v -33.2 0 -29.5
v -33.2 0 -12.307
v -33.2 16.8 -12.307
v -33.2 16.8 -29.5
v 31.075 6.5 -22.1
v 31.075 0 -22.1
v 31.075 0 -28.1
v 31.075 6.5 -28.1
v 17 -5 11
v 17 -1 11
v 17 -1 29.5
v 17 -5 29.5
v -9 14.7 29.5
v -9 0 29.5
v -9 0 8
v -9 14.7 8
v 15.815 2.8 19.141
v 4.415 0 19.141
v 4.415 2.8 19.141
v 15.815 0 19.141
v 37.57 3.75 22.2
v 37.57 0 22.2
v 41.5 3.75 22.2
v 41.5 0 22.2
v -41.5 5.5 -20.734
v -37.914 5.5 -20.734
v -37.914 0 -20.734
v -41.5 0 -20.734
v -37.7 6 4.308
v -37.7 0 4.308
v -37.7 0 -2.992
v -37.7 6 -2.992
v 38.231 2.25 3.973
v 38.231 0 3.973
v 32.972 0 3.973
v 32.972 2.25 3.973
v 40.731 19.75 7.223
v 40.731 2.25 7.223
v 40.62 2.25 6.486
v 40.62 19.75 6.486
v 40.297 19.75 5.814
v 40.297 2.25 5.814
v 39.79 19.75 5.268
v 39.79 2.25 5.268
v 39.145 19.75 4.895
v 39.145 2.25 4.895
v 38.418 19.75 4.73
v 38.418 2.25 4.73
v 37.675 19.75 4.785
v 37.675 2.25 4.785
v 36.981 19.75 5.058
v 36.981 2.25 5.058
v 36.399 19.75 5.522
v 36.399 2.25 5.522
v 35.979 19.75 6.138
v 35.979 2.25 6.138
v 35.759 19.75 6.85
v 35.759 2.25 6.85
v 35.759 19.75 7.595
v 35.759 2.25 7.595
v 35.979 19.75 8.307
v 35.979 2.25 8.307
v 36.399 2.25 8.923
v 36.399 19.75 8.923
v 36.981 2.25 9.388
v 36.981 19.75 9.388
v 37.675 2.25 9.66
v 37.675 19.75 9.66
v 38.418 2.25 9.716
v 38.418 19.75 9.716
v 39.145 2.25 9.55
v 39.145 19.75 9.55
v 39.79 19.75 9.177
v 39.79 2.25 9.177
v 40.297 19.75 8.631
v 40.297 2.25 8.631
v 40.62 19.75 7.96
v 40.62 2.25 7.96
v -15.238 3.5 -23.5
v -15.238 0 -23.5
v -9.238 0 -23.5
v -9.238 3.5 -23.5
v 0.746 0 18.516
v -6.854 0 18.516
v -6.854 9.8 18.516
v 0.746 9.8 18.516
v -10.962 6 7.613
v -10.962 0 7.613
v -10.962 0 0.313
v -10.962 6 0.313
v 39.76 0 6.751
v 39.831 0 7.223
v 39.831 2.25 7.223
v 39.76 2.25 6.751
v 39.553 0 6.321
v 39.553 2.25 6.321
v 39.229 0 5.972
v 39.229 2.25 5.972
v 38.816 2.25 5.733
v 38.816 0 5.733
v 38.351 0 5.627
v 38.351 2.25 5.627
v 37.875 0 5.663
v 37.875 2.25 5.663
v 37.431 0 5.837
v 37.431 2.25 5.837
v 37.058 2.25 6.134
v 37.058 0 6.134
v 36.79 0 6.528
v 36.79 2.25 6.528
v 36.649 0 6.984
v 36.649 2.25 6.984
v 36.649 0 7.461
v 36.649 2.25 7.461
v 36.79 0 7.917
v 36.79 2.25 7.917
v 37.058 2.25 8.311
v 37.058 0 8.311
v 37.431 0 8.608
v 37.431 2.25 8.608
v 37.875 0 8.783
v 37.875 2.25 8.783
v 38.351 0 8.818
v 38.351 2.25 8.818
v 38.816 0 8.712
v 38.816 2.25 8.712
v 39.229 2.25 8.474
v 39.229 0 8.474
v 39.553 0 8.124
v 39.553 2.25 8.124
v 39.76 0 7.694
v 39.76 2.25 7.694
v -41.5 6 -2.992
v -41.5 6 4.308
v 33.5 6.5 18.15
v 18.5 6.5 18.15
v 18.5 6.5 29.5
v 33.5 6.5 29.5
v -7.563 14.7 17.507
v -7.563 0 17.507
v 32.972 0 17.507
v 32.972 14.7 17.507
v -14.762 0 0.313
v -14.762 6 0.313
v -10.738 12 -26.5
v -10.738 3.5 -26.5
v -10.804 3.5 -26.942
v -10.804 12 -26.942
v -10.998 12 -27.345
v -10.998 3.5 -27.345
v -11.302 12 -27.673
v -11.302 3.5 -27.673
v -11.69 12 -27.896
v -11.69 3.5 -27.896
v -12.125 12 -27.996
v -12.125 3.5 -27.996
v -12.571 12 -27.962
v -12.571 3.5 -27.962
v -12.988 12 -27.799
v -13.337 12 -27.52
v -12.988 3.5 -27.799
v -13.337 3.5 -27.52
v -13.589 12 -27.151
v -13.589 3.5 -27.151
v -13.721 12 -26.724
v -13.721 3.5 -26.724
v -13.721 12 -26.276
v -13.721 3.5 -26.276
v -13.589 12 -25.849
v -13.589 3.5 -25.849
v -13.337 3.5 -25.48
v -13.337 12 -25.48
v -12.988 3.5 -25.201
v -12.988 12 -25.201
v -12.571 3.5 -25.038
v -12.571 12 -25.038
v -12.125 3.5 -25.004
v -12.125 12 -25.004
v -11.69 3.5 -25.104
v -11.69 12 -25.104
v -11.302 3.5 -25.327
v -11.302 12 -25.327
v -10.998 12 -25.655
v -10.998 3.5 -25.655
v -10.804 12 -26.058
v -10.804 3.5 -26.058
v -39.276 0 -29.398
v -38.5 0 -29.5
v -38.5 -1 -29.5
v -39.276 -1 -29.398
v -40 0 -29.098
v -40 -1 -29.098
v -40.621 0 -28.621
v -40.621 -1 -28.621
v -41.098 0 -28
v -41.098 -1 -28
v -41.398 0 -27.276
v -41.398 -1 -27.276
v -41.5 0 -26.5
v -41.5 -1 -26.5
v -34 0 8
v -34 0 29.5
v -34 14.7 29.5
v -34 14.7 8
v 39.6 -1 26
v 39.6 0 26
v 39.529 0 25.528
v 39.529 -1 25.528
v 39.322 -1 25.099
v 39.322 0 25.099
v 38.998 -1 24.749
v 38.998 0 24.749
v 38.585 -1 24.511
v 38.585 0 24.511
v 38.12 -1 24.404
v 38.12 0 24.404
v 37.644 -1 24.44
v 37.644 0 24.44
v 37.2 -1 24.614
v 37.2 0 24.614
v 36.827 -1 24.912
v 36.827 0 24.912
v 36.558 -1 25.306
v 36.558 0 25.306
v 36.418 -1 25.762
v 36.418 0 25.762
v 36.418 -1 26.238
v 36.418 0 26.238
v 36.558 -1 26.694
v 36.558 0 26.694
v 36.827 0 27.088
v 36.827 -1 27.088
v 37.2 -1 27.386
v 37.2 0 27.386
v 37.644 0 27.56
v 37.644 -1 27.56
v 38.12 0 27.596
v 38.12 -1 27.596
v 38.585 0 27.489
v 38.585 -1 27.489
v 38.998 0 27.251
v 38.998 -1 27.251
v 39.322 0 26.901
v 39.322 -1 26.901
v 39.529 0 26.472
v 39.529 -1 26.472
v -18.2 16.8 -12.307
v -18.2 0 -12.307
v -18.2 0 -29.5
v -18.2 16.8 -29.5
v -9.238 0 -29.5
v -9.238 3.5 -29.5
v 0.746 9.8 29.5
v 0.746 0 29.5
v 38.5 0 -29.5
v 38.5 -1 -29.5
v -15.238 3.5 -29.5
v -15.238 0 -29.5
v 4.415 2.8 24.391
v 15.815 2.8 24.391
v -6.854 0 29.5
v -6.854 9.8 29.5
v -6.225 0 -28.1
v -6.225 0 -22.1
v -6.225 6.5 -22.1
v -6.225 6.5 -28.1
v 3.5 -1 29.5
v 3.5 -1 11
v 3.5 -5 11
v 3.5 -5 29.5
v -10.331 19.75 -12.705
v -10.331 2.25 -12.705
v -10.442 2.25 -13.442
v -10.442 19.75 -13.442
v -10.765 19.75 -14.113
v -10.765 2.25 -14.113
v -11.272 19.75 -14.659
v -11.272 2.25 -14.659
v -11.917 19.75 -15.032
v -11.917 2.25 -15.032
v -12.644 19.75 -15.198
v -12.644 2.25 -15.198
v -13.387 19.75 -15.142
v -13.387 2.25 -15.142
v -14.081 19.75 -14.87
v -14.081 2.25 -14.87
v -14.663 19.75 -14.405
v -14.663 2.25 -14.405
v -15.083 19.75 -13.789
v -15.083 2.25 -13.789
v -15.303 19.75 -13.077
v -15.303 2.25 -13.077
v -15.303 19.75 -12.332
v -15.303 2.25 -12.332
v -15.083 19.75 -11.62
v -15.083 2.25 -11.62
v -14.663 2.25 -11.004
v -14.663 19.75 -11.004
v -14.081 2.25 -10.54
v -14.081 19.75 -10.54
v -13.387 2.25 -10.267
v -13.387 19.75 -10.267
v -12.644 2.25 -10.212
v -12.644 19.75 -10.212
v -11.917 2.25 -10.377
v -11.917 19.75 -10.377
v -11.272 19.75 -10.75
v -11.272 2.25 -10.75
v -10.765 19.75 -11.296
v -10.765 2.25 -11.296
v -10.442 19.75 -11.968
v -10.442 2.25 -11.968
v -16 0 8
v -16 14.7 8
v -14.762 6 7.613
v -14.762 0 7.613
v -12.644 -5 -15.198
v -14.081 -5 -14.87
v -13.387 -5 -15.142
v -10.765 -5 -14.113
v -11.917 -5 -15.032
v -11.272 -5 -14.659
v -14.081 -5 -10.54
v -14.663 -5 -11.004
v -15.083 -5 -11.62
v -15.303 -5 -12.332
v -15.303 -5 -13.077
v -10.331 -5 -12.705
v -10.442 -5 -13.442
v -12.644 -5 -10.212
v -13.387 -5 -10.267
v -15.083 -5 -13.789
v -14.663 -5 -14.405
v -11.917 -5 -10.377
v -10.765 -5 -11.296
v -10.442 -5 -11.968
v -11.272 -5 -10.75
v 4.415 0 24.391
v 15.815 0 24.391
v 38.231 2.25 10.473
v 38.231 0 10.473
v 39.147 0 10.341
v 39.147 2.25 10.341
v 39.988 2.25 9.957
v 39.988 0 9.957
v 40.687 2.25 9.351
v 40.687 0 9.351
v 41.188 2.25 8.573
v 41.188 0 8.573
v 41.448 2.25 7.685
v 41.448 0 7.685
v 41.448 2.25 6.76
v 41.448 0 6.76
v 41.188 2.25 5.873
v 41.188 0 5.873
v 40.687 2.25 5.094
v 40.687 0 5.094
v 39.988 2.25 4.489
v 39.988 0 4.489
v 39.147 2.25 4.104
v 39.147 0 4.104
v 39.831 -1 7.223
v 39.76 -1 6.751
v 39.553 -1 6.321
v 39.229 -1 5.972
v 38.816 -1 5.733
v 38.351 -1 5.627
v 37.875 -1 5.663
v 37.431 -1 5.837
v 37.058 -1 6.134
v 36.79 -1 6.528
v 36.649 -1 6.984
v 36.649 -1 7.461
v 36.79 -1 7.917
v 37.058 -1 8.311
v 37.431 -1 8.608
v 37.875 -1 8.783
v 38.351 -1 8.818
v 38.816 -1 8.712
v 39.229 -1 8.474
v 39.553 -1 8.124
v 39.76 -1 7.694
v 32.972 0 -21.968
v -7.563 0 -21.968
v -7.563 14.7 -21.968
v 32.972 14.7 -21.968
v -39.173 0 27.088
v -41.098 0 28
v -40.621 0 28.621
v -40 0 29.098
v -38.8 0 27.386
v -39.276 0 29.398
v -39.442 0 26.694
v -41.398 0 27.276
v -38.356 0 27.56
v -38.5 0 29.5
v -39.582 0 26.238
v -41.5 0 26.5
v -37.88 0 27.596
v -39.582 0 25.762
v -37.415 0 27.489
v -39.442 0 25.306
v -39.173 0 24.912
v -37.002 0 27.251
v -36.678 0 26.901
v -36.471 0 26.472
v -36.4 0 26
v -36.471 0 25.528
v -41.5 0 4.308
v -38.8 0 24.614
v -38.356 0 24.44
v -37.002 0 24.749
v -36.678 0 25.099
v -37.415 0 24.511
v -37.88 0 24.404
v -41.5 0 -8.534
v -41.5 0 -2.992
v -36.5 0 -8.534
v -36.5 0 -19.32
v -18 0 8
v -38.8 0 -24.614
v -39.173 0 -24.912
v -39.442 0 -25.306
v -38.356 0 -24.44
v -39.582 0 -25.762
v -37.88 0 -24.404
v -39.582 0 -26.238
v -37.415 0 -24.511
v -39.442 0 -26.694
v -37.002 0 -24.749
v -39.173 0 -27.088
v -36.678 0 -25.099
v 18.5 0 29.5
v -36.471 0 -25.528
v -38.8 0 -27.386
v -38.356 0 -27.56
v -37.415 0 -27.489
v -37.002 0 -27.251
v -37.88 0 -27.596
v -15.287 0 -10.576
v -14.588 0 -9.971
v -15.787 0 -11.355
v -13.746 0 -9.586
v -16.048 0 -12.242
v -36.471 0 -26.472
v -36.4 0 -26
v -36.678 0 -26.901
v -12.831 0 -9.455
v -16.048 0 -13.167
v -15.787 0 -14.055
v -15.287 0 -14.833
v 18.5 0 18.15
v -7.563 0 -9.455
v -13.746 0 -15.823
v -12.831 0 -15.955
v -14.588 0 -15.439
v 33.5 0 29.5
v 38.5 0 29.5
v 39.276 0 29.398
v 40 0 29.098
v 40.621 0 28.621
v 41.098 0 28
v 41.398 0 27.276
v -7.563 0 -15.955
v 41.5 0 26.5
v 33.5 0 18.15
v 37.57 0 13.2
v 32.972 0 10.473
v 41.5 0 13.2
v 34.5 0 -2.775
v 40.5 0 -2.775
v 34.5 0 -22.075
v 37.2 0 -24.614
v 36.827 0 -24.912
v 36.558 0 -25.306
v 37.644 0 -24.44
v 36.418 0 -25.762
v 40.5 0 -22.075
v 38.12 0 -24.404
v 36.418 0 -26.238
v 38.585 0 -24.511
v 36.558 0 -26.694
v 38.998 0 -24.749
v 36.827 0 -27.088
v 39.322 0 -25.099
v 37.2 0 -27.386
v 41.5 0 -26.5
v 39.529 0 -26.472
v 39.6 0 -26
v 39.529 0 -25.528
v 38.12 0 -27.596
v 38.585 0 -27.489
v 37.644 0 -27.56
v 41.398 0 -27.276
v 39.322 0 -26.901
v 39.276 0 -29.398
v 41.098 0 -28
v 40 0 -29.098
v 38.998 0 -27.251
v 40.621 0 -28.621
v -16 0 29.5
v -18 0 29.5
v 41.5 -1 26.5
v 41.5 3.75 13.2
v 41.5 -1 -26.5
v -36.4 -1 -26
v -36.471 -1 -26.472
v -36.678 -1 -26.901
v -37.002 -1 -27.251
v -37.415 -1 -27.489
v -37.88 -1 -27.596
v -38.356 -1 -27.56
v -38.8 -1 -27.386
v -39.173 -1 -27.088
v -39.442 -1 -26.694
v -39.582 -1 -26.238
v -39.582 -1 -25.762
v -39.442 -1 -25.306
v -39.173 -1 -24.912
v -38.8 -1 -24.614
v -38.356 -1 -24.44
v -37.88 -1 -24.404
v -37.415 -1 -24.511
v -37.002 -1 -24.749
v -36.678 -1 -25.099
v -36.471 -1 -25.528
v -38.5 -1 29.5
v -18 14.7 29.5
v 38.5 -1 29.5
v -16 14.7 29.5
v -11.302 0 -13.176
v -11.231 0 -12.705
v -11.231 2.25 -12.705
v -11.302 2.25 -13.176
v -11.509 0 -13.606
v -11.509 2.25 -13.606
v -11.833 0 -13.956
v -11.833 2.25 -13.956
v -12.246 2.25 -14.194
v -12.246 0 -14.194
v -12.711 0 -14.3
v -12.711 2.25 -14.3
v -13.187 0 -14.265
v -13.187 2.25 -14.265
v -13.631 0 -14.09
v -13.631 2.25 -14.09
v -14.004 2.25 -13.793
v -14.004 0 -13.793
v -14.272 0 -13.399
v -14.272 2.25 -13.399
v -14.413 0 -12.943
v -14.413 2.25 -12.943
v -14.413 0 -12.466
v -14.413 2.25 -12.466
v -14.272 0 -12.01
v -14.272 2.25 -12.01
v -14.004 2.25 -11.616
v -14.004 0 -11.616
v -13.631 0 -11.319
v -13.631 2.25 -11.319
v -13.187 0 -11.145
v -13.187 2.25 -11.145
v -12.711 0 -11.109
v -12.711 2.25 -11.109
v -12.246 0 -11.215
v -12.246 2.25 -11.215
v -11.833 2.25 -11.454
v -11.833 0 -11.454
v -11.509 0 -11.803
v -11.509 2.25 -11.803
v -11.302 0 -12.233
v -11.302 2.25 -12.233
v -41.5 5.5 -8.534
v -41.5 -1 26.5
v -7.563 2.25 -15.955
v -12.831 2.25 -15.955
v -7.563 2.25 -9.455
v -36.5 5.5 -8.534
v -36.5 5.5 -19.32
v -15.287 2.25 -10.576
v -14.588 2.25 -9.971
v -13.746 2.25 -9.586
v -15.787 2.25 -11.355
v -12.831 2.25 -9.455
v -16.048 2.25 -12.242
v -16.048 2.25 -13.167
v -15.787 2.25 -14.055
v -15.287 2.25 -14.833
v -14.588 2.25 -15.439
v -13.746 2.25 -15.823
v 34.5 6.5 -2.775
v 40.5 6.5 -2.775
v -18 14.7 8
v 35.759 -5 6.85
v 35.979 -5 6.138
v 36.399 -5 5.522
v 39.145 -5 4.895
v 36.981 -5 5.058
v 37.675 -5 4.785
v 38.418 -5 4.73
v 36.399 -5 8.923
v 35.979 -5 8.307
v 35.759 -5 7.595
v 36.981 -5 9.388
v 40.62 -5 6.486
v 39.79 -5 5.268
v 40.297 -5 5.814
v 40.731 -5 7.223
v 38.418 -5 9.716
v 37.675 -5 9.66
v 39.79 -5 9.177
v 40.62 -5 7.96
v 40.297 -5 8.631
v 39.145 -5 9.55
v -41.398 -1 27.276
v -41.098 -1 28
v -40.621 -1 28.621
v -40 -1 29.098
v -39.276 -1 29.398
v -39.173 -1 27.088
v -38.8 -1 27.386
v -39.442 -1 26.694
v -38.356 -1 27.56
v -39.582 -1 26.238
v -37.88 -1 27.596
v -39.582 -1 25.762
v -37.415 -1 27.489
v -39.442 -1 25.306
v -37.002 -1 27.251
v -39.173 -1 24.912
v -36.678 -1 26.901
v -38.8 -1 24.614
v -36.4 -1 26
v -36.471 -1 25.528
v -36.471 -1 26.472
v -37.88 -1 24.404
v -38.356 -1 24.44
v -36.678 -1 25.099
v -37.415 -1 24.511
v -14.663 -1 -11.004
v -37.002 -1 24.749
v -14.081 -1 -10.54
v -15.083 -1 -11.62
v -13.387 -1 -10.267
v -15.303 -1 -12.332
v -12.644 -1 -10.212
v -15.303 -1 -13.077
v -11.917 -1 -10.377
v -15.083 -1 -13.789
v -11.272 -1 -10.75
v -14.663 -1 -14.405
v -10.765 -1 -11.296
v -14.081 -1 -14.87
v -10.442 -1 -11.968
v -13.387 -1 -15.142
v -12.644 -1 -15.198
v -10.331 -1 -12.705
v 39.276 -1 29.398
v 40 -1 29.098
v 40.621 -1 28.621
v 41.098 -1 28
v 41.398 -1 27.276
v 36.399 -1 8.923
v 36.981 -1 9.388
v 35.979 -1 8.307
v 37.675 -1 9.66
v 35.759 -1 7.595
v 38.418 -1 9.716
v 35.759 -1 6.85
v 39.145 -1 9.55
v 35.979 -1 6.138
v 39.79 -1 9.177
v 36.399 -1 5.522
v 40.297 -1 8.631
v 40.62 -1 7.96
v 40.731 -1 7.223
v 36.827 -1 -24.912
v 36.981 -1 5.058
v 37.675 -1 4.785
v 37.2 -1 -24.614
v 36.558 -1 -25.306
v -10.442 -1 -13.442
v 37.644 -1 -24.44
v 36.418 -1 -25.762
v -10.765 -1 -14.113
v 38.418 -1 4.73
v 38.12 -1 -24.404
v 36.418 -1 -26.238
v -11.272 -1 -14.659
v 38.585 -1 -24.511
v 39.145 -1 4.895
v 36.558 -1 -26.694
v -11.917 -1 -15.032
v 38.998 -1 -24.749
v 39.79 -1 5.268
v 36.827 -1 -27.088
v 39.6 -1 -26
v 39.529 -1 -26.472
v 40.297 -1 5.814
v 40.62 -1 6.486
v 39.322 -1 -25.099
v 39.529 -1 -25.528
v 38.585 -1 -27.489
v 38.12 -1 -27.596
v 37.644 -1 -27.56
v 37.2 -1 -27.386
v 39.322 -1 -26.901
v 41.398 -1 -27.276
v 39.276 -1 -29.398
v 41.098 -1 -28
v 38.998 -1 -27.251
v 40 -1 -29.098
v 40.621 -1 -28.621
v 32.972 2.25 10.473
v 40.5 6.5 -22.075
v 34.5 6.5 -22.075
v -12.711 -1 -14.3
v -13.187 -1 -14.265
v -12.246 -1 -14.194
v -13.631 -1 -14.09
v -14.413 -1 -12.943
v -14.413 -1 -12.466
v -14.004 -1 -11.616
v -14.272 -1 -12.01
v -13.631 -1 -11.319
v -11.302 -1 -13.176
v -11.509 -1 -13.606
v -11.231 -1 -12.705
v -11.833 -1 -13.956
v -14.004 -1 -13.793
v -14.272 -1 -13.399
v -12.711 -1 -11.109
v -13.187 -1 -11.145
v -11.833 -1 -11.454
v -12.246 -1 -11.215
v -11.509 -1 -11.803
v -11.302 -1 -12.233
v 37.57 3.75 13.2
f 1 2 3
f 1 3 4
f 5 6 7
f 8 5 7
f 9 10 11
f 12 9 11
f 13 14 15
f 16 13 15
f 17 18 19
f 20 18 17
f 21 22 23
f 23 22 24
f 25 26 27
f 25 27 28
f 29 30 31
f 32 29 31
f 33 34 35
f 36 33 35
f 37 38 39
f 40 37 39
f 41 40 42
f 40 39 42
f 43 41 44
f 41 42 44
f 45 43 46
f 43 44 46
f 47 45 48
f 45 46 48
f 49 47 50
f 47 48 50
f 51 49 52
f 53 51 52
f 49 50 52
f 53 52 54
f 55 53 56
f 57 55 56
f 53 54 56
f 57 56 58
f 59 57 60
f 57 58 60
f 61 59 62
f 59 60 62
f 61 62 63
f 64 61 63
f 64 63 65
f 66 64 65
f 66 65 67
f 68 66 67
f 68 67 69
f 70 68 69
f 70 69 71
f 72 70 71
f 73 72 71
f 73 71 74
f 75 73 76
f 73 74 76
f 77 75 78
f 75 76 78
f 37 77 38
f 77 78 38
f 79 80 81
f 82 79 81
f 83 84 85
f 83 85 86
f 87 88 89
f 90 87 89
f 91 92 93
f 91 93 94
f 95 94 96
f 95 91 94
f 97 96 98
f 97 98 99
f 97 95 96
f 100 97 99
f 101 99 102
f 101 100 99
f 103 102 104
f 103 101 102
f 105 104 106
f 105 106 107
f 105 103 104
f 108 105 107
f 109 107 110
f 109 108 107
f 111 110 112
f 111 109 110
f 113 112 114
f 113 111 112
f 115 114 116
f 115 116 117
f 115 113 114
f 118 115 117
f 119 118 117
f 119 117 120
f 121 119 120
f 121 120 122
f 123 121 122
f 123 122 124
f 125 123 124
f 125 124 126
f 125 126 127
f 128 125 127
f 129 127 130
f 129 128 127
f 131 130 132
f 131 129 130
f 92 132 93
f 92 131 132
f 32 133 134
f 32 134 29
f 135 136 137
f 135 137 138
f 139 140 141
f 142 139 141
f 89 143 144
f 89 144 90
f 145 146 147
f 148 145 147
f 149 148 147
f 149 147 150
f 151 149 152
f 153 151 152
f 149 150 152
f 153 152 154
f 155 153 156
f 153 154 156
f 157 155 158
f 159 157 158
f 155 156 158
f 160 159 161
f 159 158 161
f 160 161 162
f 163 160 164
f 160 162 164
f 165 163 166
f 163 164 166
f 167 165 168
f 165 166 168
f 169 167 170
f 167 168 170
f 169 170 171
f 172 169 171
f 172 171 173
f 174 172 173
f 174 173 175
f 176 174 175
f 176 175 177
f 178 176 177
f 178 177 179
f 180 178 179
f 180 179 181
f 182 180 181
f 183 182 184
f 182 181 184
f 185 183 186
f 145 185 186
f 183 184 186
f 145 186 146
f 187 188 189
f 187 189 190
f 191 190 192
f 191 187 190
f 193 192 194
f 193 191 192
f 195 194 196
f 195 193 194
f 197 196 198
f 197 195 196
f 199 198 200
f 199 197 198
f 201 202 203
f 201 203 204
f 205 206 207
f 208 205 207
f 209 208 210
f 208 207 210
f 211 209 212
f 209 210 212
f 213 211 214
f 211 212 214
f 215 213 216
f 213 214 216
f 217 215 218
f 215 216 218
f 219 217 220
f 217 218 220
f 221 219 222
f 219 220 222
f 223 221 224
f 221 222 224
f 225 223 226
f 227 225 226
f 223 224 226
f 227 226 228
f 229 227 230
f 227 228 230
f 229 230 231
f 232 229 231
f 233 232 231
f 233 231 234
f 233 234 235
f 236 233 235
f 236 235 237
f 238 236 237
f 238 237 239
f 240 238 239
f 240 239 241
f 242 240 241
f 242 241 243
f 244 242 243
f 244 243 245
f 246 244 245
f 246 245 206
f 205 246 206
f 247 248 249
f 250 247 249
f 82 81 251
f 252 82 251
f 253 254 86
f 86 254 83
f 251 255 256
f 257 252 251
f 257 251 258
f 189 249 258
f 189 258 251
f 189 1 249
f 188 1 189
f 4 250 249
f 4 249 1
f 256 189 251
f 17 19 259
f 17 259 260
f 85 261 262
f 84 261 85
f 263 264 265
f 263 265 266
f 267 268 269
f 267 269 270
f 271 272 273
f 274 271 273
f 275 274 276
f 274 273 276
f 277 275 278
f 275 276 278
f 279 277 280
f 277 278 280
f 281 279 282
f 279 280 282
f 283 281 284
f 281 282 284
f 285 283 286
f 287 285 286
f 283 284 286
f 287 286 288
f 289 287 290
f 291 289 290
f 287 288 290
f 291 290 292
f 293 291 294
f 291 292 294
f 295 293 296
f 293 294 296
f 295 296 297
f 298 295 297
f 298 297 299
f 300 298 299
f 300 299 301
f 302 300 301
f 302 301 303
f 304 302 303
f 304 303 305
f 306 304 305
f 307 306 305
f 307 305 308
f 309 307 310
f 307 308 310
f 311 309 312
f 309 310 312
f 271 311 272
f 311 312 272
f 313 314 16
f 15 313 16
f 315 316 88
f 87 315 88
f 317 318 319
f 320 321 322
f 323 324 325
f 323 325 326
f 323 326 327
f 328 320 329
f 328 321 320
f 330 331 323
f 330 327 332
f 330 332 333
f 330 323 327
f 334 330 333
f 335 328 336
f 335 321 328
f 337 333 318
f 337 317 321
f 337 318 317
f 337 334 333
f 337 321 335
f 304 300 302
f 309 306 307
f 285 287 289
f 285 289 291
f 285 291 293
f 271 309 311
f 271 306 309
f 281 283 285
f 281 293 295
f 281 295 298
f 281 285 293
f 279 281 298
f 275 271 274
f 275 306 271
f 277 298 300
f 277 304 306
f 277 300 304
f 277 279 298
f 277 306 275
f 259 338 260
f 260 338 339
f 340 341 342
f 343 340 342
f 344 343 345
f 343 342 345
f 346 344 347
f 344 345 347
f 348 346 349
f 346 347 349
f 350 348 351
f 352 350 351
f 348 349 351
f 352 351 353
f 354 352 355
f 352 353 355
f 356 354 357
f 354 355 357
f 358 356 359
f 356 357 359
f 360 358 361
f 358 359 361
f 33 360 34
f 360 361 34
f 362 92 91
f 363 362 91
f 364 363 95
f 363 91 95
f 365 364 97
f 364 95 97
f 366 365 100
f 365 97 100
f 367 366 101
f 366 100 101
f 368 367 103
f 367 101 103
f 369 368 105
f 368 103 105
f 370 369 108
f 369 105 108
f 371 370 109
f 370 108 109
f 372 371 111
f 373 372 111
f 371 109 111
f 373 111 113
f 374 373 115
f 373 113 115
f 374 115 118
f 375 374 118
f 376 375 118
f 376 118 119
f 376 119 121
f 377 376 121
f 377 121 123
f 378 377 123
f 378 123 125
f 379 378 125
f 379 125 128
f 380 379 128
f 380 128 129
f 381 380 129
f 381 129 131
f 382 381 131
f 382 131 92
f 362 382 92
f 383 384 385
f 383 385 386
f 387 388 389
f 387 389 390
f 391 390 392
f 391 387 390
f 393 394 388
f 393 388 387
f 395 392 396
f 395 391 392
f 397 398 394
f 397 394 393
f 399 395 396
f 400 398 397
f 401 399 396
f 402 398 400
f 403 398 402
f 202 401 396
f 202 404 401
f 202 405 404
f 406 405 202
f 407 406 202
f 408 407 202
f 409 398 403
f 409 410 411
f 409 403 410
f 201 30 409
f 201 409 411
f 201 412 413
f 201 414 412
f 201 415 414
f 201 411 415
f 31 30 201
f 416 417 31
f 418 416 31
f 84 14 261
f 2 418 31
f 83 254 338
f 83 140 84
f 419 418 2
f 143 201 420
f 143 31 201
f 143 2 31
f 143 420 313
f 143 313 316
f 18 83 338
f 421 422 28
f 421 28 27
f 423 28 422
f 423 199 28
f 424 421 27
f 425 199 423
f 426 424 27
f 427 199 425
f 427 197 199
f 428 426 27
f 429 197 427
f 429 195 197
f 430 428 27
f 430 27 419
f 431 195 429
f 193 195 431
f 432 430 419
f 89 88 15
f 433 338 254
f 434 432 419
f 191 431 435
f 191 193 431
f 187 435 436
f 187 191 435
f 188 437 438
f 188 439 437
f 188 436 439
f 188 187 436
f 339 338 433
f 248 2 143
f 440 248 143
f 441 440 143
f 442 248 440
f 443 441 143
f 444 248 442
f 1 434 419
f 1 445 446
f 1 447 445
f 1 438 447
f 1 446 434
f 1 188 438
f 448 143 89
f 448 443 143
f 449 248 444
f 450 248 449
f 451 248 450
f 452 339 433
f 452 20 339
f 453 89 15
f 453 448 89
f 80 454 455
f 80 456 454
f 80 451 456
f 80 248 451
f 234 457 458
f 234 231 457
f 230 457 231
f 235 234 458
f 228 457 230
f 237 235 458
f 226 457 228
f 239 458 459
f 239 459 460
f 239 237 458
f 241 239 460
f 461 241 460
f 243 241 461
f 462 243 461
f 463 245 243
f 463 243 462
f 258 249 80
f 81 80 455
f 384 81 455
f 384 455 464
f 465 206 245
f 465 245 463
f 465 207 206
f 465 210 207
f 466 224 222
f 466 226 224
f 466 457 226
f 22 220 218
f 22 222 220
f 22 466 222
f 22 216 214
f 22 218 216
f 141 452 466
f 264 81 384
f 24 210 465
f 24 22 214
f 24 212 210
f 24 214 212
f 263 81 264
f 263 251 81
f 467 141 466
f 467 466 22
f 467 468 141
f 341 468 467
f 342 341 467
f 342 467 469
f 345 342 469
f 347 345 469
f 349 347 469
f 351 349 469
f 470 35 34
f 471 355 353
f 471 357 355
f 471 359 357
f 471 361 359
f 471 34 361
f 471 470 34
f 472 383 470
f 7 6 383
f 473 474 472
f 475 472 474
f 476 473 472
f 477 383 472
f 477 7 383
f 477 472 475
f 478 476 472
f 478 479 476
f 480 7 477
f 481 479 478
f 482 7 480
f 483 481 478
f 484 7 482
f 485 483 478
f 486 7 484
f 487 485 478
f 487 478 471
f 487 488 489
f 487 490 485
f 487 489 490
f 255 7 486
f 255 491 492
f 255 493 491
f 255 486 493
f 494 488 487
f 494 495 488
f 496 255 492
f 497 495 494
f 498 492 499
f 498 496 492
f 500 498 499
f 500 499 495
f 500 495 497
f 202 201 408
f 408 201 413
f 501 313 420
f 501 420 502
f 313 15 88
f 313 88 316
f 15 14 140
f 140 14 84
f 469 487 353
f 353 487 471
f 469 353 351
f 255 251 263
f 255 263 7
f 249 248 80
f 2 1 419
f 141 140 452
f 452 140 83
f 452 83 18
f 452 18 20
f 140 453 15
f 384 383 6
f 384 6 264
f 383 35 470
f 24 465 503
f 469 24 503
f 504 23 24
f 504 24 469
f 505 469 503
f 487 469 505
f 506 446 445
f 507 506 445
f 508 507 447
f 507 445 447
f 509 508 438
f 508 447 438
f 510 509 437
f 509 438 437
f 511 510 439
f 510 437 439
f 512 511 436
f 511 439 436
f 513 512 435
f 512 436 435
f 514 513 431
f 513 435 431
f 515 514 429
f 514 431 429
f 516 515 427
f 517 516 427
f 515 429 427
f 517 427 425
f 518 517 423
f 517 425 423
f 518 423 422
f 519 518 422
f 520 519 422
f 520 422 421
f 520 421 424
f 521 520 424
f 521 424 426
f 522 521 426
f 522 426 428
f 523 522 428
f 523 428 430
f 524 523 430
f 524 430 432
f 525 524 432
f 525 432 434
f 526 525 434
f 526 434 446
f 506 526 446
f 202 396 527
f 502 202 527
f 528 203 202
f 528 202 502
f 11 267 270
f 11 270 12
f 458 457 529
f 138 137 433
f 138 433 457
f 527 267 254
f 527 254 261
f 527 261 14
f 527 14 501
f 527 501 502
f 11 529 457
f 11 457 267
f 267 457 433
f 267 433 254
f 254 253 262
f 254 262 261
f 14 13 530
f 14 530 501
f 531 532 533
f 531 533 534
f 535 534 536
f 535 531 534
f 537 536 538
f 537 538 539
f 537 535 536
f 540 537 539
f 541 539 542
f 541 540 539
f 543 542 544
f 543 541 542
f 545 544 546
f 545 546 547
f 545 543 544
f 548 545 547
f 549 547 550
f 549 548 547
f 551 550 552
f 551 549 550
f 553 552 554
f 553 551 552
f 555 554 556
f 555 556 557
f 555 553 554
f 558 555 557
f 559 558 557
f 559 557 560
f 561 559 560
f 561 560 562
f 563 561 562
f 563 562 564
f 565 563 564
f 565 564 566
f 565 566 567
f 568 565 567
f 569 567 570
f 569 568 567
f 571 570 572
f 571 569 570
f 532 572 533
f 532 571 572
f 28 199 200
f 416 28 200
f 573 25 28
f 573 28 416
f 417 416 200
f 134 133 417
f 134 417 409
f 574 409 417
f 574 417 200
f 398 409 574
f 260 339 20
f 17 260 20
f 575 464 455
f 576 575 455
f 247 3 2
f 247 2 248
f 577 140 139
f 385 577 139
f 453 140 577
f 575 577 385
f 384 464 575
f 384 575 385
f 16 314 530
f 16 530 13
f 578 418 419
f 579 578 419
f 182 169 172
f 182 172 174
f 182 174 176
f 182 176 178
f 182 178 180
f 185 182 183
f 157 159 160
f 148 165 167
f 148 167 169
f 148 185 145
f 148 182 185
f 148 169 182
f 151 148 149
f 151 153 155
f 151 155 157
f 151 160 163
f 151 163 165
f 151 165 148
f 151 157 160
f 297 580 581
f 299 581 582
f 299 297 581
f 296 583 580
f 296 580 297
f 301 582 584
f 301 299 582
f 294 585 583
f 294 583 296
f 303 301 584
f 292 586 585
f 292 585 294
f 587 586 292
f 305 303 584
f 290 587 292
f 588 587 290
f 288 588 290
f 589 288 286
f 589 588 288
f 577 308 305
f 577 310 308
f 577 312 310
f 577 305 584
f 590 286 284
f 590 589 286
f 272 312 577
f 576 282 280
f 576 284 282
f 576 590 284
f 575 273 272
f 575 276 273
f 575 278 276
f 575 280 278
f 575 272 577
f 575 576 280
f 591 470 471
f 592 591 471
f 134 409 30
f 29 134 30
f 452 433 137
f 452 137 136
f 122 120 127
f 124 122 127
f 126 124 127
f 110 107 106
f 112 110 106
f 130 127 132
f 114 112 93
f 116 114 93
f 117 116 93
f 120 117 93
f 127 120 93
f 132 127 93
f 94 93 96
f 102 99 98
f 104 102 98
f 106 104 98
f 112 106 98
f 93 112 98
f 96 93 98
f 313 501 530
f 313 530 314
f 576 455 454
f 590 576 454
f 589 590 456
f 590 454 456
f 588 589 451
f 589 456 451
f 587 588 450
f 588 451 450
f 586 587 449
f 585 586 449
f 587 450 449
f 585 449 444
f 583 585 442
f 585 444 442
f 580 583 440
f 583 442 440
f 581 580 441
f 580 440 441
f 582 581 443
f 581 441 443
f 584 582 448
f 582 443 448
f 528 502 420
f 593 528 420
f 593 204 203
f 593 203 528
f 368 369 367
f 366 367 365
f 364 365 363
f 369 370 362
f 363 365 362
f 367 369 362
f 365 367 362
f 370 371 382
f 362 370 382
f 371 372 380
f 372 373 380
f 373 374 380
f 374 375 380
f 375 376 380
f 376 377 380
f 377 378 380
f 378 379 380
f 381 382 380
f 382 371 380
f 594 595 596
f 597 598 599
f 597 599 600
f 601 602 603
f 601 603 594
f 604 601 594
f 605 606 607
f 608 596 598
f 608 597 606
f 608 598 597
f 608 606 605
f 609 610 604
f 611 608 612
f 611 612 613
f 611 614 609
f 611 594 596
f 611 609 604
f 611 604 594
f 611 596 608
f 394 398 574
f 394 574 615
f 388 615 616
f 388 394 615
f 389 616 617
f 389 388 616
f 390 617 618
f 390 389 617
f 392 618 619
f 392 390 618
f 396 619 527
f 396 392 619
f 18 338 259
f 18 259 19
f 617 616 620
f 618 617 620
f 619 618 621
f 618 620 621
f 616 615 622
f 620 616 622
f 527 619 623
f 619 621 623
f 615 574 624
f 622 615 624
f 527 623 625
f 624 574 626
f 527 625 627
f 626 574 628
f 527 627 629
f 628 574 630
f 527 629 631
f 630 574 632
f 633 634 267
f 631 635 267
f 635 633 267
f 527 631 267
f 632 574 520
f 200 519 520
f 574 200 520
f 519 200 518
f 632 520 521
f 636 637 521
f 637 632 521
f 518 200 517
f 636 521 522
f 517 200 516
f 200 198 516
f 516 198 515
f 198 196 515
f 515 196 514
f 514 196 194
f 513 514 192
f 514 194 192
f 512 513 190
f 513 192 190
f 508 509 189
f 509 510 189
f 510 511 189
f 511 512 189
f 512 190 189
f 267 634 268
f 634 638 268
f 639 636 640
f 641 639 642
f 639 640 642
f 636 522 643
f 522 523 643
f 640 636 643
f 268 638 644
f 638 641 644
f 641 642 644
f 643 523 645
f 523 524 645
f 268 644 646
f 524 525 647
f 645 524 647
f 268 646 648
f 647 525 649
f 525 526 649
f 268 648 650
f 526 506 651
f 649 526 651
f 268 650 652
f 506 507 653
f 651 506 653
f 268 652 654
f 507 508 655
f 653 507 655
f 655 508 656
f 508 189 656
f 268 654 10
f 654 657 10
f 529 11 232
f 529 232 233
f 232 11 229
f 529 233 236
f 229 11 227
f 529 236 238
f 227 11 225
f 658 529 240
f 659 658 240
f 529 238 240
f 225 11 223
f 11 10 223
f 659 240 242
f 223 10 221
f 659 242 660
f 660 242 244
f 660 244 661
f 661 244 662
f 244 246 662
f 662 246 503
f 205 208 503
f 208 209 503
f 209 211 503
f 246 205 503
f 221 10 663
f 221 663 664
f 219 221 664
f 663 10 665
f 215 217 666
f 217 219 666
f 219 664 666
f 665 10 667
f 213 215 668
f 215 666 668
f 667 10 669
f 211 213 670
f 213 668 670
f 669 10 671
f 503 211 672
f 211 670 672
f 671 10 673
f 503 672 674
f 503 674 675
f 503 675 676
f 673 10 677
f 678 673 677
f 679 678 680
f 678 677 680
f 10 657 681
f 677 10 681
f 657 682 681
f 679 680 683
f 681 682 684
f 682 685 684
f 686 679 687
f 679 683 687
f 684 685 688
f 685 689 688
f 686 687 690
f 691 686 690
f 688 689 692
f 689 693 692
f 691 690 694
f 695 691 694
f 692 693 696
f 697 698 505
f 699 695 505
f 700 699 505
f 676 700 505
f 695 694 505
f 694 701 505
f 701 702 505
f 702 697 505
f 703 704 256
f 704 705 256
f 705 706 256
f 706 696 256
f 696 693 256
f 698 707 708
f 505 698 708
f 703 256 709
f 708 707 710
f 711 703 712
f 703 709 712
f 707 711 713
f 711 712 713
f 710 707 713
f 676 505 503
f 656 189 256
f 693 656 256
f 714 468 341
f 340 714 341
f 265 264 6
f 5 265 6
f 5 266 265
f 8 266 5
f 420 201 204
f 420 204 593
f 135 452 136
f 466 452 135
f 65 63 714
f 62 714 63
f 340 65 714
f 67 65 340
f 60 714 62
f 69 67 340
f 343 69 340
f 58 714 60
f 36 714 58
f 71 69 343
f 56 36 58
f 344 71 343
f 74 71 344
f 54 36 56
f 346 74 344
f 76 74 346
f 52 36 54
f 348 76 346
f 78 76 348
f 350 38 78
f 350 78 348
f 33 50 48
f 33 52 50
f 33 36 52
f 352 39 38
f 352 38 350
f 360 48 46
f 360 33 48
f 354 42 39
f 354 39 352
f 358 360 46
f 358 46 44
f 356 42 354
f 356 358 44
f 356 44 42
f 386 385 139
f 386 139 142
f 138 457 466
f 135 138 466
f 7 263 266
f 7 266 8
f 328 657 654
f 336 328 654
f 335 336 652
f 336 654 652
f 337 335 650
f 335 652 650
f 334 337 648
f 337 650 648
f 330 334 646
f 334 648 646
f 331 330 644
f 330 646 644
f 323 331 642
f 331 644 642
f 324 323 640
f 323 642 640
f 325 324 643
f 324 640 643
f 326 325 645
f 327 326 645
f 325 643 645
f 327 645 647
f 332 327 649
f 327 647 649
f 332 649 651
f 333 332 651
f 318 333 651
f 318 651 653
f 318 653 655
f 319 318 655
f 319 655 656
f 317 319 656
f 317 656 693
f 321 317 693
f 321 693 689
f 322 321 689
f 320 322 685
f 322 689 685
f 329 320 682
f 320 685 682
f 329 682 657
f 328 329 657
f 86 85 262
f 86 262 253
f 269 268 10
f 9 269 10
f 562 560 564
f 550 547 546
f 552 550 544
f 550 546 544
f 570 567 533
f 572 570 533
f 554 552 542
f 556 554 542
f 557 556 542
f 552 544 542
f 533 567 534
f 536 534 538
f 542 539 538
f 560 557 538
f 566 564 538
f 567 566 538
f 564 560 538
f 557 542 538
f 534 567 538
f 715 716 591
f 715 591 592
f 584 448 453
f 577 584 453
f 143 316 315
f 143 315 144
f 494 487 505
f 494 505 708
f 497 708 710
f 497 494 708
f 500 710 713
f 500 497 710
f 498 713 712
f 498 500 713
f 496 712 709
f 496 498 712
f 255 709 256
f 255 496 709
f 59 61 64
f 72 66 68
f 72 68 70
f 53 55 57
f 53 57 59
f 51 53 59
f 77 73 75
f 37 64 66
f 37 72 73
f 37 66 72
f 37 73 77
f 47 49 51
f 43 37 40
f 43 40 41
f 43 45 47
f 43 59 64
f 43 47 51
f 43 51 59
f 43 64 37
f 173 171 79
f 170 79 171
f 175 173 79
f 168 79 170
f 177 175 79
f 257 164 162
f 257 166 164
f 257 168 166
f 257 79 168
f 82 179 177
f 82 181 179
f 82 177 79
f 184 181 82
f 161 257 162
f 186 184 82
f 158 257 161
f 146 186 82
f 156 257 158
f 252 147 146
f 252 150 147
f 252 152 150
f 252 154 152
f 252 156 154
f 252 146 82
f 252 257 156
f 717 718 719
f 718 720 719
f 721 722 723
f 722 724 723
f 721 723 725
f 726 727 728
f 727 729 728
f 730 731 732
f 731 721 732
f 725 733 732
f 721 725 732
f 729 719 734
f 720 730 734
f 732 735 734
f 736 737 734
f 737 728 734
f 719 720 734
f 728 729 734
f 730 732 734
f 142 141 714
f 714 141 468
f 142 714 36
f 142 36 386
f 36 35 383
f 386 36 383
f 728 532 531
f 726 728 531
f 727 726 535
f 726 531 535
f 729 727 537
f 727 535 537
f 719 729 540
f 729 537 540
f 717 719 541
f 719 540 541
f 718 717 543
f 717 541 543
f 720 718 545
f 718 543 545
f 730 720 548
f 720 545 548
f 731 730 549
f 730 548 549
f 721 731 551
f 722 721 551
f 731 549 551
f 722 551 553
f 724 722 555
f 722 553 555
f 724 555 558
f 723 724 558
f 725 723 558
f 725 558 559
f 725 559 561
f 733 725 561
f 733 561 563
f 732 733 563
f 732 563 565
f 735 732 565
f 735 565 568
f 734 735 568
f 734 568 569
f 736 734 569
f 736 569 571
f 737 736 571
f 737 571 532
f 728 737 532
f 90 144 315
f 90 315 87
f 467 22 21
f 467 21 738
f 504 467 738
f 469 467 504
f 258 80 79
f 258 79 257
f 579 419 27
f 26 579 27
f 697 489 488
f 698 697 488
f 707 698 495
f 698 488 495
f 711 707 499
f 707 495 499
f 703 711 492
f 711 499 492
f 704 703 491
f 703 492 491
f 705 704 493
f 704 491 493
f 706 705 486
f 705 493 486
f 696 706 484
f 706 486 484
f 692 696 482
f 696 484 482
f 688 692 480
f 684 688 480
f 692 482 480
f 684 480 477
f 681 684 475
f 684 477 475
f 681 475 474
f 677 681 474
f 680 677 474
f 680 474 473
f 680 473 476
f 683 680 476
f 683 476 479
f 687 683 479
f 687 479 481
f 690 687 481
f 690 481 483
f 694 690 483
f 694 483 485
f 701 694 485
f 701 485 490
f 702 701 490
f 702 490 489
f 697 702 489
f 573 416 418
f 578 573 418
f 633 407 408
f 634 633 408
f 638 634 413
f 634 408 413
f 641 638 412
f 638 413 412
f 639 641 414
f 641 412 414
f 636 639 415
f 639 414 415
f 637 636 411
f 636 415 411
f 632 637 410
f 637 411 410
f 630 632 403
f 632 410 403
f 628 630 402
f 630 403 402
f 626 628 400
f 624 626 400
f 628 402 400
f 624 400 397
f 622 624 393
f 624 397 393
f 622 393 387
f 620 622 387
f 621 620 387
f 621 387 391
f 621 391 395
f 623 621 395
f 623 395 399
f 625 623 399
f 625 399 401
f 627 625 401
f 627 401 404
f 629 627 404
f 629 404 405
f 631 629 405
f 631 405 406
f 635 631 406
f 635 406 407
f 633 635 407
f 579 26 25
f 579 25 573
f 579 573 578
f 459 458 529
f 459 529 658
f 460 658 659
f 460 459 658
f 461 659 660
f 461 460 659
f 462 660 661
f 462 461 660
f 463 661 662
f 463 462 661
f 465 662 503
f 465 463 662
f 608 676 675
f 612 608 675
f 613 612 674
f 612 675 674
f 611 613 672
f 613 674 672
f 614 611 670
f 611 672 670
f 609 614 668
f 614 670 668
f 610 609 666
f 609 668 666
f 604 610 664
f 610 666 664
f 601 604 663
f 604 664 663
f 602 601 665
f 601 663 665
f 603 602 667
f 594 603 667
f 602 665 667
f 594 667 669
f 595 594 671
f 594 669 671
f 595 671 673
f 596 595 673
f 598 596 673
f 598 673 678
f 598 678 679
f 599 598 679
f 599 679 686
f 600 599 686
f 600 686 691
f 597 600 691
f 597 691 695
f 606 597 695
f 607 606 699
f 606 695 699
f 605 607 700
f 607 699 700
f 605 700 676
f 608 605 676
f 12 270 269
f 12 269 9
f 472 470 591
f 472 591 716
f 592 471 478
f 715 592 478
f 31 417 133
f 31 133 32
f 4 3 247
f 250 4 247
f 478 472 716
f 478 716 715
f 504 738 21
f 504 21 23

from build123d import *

# Parameters (mm, degrees)
PCB_EXTRUDE_DEPTH            = 1
SKETCH3_R                    = 1.6
PCB_HOLES_AND_TABS_DEPTH     = 51.926417506
UART_EXTRUDE_DEPTH           = 5.5
SKETCH4_3_W                  = 3.8
SKETCH4_3_H                  = 7.3
BATTERY_AND_FAN_HEADER_DEPTH = 6
HEATSINK_FAN_DEPTH           = 14.7
SKETCH4_6_W                  = 6
SKETCH4_6_H                  = 6
POWERBUTTON_DEPTH            = 3.5
SKETCH5_R                    = 1.5
POWERBUTTONSWITCH_DEPTH      = 8.5
SKETCH4_8_W                  = 7.6
SKETCH4_8_H                  = 10.983605977
DCPOWERJACK_DEPTH            = 9.8
HEATSINKMOUNTTABS_START      = 2.25
SKETCH4_11_R                 = 1.6
HEATSINKMOUNTTABS_DEPTH      = 2.25
SKETCH6_R                    = 2.5
HEATSINKSPRINGS_DEPTH        = 17.5
SKETCH4_13_W                 = 11.4
SKETCH4_13_H                 = 5.25
MICROSD_DEPTH                = 2.8
UNDERSIDE_START              = 4
SKETCH7_R                    = 2.5
SKETCH7_W                    = 13.5
SKETCH7_H                    = 18.5
UNDERSIDE_DEPTH              = 4
GROSS_COMPONENTS_15_W        = 16
GROSS_COMPONENTS_15_H        = 21.5
ETHERNET_DEPTH               = 14.7
GROSS_COMPONENTS_16_W        = 15
GROSS_COMPONENTS_16_H        = 17.193227116
USBX2_DEPTH                  = 16.8
GROSS_COMPONENTS_17_W        = 7
GROSS_COMPONENTS_17_H        = 21.5
USBVERTICAL_DEPTH            = 14.7
GROSS_COMPONENTS_18_W        = 15
GROSS_COMPONENTS_18_H        = 11.350223911
HDMI_DEPTH                   = 6.5
GROSS_COMPONENTS_19_W        = 3.930498855
GROSS_COMPONENTS_19_H        = 9
DIP_DEPTH                    = 3.75
GROSS_COMPONENTS_21_W        = 37.3
GROSS_COMPONENTS_21_H        = 6
GROSS_COMPONENTS_21_W_2      = 6
GROSS_COMPONENTS_21_H_2      = 19.3
PINHEADERS_DEPTH             = 6.5


with BuildPart() as part:
    # Sketch1 → PCB Extrude (new body)
    with BuildSketch(Plane(origin=(0, 0, 0), x_dir=(1, 0, 0), z_dir=(0, 1, 0))):
        with BuildLine():
            Line((-38.5, -29.5), (38.5, -29.5))
            ThreePointArc((38.5, -29.5), (40.621320344, -28.621320344), (41.5, -26.5))
            Line((41.5, -26.5), (41.5, 26.5))
            ThreePointArc((41.5, 26.5), (40.621320344, 28.621320344), (38.5, 29.5))
            Line((38.5, 29.5), (-38.5, 29.5))
            ThreePointArc((-38.5, 29.5), (-40.621320344, 28.621320344), (-41.5, 26.5))
            Line((-41.5, 26.5), (-41.5, -26.5))
            ThreePointArc((-41.5, -26.5), (-40.621320344, -28.621320344), (-38.5, -29.5))
        make_face()
    extrude(amount=-PCB_EXTRUDE_DEPTH)

    # Sketch3 → PCB Holes and Tabs (cut, through all)
    with BuildSketch(Plane(origin=(0, 0, 0), x_dir=(1, 0, 0), z_dir=(0, 1, 0))):
        with Locations((-12.830824848, 12.70463972)):
            Circle(SKETCH3_R)
        with Locations((38.231306466, -7.222675777)):
            Circle(SKETCH3_R)
        with Locations((-38, 26)):
            Circle(SKETCH3_R)
        with Locations((38, 26)):
            Circle(SKETCH3_R)
        with Locations((38, -26)):
            Circle(SKETCH3_R)
        with Locations((-38, -26)):
            Circle(SKETCH3_R)
    extrude(amount=-PCB_HOLES_AND_TABS_DEPTH, mode=Mode.SUBTRACT)

    # Gross Components → UART Extrude (add)
    with BuildSketch(Plane(origin=(-30.681810048, 0, -29.297110237), x_dir=(1, 0, 0), z_dir=(0, 1, 0))):
        Polygon((-7.232403514, -8.562818523), (-10.818189952, -8.562818523), (-10.818189952, -20.762818523), (-5.818189952, -20.762818523), (-5.818189952, -9.977032085), align=None)
    extrude(amount=UART_EXTRUDE_DEPTH)

    # Sketch4_3 → Battery and Fan Header (add)
    with BuildSketch(Plane(origin=(-30.681810048, 0, -29.297110237), x_dir=(1, 0, 0), z_dir=(0, 1, 0))):
        with Locations((-8.918189952, -29.954934674)):
            Rectangle(SKETCH4_3_W, SKETCH4_3_H)
        with Locations((17.820043283, -33.259722768)):
            Rectangle(SKETCH4_3_W, SKETCH4_3_H)
    extrude(amount=BATTERY_AND_FAN_HEADER_DEPTH)

    # Sketch4_4 → HeatSink_Fan (add)
    with BuildSketch(Plane(origin=(-30.681810048, 0, -29.297110237), x_dir=(1, 0, 0), z_dir=(0, 1, 0))):
        Polygon((63.653948261, -46.804143445), (63.653948261, -39.769786014), (63.653948261, -33.269786014), (63.653948261, -7.329049339), (23.119229334, -7.329049339), (23.119229334, -13.342470517), (23.119229334, -19.842470517), (23.119229334, -46.804143445), align=None)
    extrude(amount=HEATSINK_FAN_DEPTH)

    # Sketch4_6 → PowerButton (add)
    with BuildSketch(Plane(origin=(-30.681810048, 0, -29.297110237), x_dir=(1, 0, 0), z_dir=(0, 1, 0))):
        with Locations((18.444226135, -2.797110237)):
            Rectangle(SKETCH4_6_W, SKETCH4_6_H)
    extrude(amount=POWERBUTTON_DEPTH)

    # Sketch5 → PowerButtonSwitch (add)
    with BuildSketch(Plane(origin=(0, 3.5, 0), x_dir=(1, 0, 0), z_dir=(0, 1, 0))):
        with Locations((-12.237583913, 26.5)):
            Circle(SKETCH5_R)
    extrude(amount=POWERBUTTONSWITCH_DEPTH)

    # Sketch4_8 → DCPowerJack (add)
    with BuildSketch(Plane(origin=(-30.681810048, 0, -29.297110237), x_dir=(1, 0, 0), z_dir=(0, 1, 0))):
        with Locations((27.627643628, -53.305307249)):
            Rectangle(SKETCH4_8_W, SKETCH4_8_H)
    extrude(amount=DCPOWERJACK_DEPTH)

    # Sketch4_11 → HeatSinkMountTabs (add)
    # profile 1 of 2: a face of its own
    with BuildSketch(Plane(origin=(-30.681810048, 0, -29.297110237), x_dir=(1, 0, 0), z_dir=(0, 1, 0)).offset(HEATSINKMOUNTTABS_START)):
        with BuildLine():
            Line((63.653948261, -39.769786014), (68.913116514, -39.769786014))
            ThreePointArc((68.913116514, -39.769786014), (72.163116514, -36.519786014), (68.913116514, -33.269786014))
            Line((68.913116514, -33.269786014), (63.653948261, -33.269786014))
            Line((63.653948261, -33.269786014), (63.653948261, -39.769786014))
        make_face()
        with Locations((68.913116514, -36.519786014)):
            Circle(SKETCH4_11_R, mode=Mode.SUBTRACT)
    # profile 2 of 2: a face of its own
    with BuildSketch(Plane(origin=(-30.681810048, 0, -29.297110237), x_dir=(1, 0, 0), z_dir=(0, 1, 0)).offset(HEATSINKMOUNTTABS_START)):
        with BuildLine():
            Line((17.8509852, -19.842470517), (23.119229334, -19.842470517))
            Line((23.119229334, -19.842470517), (23.119229334, -13.342470517))
            Line((23.119229334, -13.342470517), (17.8509852, -13.342470517))
            ThreePointArc((17.8509852, -13.342470517), (14.6009852, -16.592470517), (17.8509852, -19.842470517))
        make_face()
        with Locations((17.8509852, -16.592470517)):
            Circle(SKETCH4_11_R, mode=Mode.SUBTRACT)
    extrude(amount=-HEATSINKMOUNTTABS_DEPTH)

    # Sketch6 → HeatSinkSprings (add)
    with BuildSketch(Plane(origin=(0, 2.25, 0), x_dir=(1, 0, 0), z_dir=(0, 1, 0))):
        with Locations((38.231306466, -7.222675777)):
            Circle(SKETCH6_R)
        with Locations((-12.830824848, 12.70463972)):
            Circle(SKETCH6_R)
    extrude(amount=HEATSINKSPRINGS_DEPTH)

    # Sketch4_13 → microSD (add)
    with BuildSketch(Plane(origin=(-30.681810048, 0, -29.297110237), x_dir=(1, 0, 0), z_dir=(0, 1, 0))):
        with Locations((40.797038503, -51.062962156)):
            Rectangle(SKETCH4_13_W, SKETCH4_13_H)
    extrude(amount=MICROSD_DEPTH)

    # Sketch7 → UnderSide (add)
    with BuildSketch(Plane.XZ.offset(1).offset(UNDERSIDE_START)):
        with Locations((-12.830824848, -12.70463972)):
            Circle(SKETCH7_R)
        with Locations((38.231306466, 7.222675777)):
            Circle(SKETCH7_R)
        with Locations((10.25, 20.25)):
            Rectangle(SKETCH7_W, SKETCH7_H)
    extrude(amount=-UNDERSIDE_DEPTH)

    # Gross Components_15 → Ethernet (add)
    with BuildSketch(Plane(origin=(-30.681810048, 0, -29.297110237), x_dir=(1, 0, 0), z_dir=(0, 1, 0))):
        with Locations((4.681810048, -48.047110237)):
            Rectangle(GROSS_COMPONENTS_15_W, GROSS_COMPONENTS_15_H)
    extrude(amount=ETHERNET_DEPTH)

    # Gross Components_16 → USBx2 (add)
    with BuildSketch(Plane(origin=(-30.681810048, 0, -29.297110237), x_dir=(1, 0, 0), z_dir=(0, 1, 0))):
        with Locations((4.981810048, -8.393723795)):
            Rectangle(GROSS_COMPONENTS_16_W, GROSS_COMPONENTS_16_H)
    extrude(amount=USBX2_DEPTH)

    # Gross Components_17 → USBvertical (add)
    with BuildSketch(Plane(origin=(-30.681810048, 0, -29.297110237), x_dir=(1, 0, 0), z_dir=(0, 1, 0))):
        with Locations((18.181810048, -48.047110237)):
            Rectangle(GROSS_COMPONENTS_17_W, GROSS_COMPONENTS_17_H)
    extrude(amount=USBVERTICAL_DEPTH)

    # Gross Components_18 → HDMI (add)
    with BuildSketch(Plane(origin=(-30.681810048, 0, -29.297110237), x_dir=(1, 0, 0), z_dir=(0, 1, 0))):
        with Locations((56.681810048, -53.121998282)):
            Rectangle(GROSS_COMPONENTS_18_W, GROSS_COMPONENTS_18_H)
    extrude(amount=HDMI_DEPTH)

    # Gross Components_19 → DIP (add)
    with BuildSketch(Plane(origin=(-30.681810048, 0, -29.297110237), x_dir=(1, 0, 0), z_dir=(0, 1, 0))):
        with Locations((70.216560621, -46.997110237)):
            Rectangle(GROSS_COMPONENTS_19_W, GROSS_COMPONENTS_19_H)
    extrude(amount=DIP_DEPTH)

    # Gross Components_21 → PinHeaders (add)
    with BuildSketch(Plane(origin=(-30.681810048, 0, -29.297110237), x_dir=(1, 0, 0), z_dir=(0, 1, 0))):
        with Locations((43.106667362, -4.197110237)):
            Rectangle(GROSS_COMPONENTS_21_W, GROSS_COMPONENTS_21_H)
        with Locations((68.181810048, -16.871799168)):
            Rectangle(GROSS_COMPONENTS_21_W_2, GROSS_COMPONENTS_21_H_2)
    extrude(amount=PINHEADERS_DEPTH)


solid = part.part
